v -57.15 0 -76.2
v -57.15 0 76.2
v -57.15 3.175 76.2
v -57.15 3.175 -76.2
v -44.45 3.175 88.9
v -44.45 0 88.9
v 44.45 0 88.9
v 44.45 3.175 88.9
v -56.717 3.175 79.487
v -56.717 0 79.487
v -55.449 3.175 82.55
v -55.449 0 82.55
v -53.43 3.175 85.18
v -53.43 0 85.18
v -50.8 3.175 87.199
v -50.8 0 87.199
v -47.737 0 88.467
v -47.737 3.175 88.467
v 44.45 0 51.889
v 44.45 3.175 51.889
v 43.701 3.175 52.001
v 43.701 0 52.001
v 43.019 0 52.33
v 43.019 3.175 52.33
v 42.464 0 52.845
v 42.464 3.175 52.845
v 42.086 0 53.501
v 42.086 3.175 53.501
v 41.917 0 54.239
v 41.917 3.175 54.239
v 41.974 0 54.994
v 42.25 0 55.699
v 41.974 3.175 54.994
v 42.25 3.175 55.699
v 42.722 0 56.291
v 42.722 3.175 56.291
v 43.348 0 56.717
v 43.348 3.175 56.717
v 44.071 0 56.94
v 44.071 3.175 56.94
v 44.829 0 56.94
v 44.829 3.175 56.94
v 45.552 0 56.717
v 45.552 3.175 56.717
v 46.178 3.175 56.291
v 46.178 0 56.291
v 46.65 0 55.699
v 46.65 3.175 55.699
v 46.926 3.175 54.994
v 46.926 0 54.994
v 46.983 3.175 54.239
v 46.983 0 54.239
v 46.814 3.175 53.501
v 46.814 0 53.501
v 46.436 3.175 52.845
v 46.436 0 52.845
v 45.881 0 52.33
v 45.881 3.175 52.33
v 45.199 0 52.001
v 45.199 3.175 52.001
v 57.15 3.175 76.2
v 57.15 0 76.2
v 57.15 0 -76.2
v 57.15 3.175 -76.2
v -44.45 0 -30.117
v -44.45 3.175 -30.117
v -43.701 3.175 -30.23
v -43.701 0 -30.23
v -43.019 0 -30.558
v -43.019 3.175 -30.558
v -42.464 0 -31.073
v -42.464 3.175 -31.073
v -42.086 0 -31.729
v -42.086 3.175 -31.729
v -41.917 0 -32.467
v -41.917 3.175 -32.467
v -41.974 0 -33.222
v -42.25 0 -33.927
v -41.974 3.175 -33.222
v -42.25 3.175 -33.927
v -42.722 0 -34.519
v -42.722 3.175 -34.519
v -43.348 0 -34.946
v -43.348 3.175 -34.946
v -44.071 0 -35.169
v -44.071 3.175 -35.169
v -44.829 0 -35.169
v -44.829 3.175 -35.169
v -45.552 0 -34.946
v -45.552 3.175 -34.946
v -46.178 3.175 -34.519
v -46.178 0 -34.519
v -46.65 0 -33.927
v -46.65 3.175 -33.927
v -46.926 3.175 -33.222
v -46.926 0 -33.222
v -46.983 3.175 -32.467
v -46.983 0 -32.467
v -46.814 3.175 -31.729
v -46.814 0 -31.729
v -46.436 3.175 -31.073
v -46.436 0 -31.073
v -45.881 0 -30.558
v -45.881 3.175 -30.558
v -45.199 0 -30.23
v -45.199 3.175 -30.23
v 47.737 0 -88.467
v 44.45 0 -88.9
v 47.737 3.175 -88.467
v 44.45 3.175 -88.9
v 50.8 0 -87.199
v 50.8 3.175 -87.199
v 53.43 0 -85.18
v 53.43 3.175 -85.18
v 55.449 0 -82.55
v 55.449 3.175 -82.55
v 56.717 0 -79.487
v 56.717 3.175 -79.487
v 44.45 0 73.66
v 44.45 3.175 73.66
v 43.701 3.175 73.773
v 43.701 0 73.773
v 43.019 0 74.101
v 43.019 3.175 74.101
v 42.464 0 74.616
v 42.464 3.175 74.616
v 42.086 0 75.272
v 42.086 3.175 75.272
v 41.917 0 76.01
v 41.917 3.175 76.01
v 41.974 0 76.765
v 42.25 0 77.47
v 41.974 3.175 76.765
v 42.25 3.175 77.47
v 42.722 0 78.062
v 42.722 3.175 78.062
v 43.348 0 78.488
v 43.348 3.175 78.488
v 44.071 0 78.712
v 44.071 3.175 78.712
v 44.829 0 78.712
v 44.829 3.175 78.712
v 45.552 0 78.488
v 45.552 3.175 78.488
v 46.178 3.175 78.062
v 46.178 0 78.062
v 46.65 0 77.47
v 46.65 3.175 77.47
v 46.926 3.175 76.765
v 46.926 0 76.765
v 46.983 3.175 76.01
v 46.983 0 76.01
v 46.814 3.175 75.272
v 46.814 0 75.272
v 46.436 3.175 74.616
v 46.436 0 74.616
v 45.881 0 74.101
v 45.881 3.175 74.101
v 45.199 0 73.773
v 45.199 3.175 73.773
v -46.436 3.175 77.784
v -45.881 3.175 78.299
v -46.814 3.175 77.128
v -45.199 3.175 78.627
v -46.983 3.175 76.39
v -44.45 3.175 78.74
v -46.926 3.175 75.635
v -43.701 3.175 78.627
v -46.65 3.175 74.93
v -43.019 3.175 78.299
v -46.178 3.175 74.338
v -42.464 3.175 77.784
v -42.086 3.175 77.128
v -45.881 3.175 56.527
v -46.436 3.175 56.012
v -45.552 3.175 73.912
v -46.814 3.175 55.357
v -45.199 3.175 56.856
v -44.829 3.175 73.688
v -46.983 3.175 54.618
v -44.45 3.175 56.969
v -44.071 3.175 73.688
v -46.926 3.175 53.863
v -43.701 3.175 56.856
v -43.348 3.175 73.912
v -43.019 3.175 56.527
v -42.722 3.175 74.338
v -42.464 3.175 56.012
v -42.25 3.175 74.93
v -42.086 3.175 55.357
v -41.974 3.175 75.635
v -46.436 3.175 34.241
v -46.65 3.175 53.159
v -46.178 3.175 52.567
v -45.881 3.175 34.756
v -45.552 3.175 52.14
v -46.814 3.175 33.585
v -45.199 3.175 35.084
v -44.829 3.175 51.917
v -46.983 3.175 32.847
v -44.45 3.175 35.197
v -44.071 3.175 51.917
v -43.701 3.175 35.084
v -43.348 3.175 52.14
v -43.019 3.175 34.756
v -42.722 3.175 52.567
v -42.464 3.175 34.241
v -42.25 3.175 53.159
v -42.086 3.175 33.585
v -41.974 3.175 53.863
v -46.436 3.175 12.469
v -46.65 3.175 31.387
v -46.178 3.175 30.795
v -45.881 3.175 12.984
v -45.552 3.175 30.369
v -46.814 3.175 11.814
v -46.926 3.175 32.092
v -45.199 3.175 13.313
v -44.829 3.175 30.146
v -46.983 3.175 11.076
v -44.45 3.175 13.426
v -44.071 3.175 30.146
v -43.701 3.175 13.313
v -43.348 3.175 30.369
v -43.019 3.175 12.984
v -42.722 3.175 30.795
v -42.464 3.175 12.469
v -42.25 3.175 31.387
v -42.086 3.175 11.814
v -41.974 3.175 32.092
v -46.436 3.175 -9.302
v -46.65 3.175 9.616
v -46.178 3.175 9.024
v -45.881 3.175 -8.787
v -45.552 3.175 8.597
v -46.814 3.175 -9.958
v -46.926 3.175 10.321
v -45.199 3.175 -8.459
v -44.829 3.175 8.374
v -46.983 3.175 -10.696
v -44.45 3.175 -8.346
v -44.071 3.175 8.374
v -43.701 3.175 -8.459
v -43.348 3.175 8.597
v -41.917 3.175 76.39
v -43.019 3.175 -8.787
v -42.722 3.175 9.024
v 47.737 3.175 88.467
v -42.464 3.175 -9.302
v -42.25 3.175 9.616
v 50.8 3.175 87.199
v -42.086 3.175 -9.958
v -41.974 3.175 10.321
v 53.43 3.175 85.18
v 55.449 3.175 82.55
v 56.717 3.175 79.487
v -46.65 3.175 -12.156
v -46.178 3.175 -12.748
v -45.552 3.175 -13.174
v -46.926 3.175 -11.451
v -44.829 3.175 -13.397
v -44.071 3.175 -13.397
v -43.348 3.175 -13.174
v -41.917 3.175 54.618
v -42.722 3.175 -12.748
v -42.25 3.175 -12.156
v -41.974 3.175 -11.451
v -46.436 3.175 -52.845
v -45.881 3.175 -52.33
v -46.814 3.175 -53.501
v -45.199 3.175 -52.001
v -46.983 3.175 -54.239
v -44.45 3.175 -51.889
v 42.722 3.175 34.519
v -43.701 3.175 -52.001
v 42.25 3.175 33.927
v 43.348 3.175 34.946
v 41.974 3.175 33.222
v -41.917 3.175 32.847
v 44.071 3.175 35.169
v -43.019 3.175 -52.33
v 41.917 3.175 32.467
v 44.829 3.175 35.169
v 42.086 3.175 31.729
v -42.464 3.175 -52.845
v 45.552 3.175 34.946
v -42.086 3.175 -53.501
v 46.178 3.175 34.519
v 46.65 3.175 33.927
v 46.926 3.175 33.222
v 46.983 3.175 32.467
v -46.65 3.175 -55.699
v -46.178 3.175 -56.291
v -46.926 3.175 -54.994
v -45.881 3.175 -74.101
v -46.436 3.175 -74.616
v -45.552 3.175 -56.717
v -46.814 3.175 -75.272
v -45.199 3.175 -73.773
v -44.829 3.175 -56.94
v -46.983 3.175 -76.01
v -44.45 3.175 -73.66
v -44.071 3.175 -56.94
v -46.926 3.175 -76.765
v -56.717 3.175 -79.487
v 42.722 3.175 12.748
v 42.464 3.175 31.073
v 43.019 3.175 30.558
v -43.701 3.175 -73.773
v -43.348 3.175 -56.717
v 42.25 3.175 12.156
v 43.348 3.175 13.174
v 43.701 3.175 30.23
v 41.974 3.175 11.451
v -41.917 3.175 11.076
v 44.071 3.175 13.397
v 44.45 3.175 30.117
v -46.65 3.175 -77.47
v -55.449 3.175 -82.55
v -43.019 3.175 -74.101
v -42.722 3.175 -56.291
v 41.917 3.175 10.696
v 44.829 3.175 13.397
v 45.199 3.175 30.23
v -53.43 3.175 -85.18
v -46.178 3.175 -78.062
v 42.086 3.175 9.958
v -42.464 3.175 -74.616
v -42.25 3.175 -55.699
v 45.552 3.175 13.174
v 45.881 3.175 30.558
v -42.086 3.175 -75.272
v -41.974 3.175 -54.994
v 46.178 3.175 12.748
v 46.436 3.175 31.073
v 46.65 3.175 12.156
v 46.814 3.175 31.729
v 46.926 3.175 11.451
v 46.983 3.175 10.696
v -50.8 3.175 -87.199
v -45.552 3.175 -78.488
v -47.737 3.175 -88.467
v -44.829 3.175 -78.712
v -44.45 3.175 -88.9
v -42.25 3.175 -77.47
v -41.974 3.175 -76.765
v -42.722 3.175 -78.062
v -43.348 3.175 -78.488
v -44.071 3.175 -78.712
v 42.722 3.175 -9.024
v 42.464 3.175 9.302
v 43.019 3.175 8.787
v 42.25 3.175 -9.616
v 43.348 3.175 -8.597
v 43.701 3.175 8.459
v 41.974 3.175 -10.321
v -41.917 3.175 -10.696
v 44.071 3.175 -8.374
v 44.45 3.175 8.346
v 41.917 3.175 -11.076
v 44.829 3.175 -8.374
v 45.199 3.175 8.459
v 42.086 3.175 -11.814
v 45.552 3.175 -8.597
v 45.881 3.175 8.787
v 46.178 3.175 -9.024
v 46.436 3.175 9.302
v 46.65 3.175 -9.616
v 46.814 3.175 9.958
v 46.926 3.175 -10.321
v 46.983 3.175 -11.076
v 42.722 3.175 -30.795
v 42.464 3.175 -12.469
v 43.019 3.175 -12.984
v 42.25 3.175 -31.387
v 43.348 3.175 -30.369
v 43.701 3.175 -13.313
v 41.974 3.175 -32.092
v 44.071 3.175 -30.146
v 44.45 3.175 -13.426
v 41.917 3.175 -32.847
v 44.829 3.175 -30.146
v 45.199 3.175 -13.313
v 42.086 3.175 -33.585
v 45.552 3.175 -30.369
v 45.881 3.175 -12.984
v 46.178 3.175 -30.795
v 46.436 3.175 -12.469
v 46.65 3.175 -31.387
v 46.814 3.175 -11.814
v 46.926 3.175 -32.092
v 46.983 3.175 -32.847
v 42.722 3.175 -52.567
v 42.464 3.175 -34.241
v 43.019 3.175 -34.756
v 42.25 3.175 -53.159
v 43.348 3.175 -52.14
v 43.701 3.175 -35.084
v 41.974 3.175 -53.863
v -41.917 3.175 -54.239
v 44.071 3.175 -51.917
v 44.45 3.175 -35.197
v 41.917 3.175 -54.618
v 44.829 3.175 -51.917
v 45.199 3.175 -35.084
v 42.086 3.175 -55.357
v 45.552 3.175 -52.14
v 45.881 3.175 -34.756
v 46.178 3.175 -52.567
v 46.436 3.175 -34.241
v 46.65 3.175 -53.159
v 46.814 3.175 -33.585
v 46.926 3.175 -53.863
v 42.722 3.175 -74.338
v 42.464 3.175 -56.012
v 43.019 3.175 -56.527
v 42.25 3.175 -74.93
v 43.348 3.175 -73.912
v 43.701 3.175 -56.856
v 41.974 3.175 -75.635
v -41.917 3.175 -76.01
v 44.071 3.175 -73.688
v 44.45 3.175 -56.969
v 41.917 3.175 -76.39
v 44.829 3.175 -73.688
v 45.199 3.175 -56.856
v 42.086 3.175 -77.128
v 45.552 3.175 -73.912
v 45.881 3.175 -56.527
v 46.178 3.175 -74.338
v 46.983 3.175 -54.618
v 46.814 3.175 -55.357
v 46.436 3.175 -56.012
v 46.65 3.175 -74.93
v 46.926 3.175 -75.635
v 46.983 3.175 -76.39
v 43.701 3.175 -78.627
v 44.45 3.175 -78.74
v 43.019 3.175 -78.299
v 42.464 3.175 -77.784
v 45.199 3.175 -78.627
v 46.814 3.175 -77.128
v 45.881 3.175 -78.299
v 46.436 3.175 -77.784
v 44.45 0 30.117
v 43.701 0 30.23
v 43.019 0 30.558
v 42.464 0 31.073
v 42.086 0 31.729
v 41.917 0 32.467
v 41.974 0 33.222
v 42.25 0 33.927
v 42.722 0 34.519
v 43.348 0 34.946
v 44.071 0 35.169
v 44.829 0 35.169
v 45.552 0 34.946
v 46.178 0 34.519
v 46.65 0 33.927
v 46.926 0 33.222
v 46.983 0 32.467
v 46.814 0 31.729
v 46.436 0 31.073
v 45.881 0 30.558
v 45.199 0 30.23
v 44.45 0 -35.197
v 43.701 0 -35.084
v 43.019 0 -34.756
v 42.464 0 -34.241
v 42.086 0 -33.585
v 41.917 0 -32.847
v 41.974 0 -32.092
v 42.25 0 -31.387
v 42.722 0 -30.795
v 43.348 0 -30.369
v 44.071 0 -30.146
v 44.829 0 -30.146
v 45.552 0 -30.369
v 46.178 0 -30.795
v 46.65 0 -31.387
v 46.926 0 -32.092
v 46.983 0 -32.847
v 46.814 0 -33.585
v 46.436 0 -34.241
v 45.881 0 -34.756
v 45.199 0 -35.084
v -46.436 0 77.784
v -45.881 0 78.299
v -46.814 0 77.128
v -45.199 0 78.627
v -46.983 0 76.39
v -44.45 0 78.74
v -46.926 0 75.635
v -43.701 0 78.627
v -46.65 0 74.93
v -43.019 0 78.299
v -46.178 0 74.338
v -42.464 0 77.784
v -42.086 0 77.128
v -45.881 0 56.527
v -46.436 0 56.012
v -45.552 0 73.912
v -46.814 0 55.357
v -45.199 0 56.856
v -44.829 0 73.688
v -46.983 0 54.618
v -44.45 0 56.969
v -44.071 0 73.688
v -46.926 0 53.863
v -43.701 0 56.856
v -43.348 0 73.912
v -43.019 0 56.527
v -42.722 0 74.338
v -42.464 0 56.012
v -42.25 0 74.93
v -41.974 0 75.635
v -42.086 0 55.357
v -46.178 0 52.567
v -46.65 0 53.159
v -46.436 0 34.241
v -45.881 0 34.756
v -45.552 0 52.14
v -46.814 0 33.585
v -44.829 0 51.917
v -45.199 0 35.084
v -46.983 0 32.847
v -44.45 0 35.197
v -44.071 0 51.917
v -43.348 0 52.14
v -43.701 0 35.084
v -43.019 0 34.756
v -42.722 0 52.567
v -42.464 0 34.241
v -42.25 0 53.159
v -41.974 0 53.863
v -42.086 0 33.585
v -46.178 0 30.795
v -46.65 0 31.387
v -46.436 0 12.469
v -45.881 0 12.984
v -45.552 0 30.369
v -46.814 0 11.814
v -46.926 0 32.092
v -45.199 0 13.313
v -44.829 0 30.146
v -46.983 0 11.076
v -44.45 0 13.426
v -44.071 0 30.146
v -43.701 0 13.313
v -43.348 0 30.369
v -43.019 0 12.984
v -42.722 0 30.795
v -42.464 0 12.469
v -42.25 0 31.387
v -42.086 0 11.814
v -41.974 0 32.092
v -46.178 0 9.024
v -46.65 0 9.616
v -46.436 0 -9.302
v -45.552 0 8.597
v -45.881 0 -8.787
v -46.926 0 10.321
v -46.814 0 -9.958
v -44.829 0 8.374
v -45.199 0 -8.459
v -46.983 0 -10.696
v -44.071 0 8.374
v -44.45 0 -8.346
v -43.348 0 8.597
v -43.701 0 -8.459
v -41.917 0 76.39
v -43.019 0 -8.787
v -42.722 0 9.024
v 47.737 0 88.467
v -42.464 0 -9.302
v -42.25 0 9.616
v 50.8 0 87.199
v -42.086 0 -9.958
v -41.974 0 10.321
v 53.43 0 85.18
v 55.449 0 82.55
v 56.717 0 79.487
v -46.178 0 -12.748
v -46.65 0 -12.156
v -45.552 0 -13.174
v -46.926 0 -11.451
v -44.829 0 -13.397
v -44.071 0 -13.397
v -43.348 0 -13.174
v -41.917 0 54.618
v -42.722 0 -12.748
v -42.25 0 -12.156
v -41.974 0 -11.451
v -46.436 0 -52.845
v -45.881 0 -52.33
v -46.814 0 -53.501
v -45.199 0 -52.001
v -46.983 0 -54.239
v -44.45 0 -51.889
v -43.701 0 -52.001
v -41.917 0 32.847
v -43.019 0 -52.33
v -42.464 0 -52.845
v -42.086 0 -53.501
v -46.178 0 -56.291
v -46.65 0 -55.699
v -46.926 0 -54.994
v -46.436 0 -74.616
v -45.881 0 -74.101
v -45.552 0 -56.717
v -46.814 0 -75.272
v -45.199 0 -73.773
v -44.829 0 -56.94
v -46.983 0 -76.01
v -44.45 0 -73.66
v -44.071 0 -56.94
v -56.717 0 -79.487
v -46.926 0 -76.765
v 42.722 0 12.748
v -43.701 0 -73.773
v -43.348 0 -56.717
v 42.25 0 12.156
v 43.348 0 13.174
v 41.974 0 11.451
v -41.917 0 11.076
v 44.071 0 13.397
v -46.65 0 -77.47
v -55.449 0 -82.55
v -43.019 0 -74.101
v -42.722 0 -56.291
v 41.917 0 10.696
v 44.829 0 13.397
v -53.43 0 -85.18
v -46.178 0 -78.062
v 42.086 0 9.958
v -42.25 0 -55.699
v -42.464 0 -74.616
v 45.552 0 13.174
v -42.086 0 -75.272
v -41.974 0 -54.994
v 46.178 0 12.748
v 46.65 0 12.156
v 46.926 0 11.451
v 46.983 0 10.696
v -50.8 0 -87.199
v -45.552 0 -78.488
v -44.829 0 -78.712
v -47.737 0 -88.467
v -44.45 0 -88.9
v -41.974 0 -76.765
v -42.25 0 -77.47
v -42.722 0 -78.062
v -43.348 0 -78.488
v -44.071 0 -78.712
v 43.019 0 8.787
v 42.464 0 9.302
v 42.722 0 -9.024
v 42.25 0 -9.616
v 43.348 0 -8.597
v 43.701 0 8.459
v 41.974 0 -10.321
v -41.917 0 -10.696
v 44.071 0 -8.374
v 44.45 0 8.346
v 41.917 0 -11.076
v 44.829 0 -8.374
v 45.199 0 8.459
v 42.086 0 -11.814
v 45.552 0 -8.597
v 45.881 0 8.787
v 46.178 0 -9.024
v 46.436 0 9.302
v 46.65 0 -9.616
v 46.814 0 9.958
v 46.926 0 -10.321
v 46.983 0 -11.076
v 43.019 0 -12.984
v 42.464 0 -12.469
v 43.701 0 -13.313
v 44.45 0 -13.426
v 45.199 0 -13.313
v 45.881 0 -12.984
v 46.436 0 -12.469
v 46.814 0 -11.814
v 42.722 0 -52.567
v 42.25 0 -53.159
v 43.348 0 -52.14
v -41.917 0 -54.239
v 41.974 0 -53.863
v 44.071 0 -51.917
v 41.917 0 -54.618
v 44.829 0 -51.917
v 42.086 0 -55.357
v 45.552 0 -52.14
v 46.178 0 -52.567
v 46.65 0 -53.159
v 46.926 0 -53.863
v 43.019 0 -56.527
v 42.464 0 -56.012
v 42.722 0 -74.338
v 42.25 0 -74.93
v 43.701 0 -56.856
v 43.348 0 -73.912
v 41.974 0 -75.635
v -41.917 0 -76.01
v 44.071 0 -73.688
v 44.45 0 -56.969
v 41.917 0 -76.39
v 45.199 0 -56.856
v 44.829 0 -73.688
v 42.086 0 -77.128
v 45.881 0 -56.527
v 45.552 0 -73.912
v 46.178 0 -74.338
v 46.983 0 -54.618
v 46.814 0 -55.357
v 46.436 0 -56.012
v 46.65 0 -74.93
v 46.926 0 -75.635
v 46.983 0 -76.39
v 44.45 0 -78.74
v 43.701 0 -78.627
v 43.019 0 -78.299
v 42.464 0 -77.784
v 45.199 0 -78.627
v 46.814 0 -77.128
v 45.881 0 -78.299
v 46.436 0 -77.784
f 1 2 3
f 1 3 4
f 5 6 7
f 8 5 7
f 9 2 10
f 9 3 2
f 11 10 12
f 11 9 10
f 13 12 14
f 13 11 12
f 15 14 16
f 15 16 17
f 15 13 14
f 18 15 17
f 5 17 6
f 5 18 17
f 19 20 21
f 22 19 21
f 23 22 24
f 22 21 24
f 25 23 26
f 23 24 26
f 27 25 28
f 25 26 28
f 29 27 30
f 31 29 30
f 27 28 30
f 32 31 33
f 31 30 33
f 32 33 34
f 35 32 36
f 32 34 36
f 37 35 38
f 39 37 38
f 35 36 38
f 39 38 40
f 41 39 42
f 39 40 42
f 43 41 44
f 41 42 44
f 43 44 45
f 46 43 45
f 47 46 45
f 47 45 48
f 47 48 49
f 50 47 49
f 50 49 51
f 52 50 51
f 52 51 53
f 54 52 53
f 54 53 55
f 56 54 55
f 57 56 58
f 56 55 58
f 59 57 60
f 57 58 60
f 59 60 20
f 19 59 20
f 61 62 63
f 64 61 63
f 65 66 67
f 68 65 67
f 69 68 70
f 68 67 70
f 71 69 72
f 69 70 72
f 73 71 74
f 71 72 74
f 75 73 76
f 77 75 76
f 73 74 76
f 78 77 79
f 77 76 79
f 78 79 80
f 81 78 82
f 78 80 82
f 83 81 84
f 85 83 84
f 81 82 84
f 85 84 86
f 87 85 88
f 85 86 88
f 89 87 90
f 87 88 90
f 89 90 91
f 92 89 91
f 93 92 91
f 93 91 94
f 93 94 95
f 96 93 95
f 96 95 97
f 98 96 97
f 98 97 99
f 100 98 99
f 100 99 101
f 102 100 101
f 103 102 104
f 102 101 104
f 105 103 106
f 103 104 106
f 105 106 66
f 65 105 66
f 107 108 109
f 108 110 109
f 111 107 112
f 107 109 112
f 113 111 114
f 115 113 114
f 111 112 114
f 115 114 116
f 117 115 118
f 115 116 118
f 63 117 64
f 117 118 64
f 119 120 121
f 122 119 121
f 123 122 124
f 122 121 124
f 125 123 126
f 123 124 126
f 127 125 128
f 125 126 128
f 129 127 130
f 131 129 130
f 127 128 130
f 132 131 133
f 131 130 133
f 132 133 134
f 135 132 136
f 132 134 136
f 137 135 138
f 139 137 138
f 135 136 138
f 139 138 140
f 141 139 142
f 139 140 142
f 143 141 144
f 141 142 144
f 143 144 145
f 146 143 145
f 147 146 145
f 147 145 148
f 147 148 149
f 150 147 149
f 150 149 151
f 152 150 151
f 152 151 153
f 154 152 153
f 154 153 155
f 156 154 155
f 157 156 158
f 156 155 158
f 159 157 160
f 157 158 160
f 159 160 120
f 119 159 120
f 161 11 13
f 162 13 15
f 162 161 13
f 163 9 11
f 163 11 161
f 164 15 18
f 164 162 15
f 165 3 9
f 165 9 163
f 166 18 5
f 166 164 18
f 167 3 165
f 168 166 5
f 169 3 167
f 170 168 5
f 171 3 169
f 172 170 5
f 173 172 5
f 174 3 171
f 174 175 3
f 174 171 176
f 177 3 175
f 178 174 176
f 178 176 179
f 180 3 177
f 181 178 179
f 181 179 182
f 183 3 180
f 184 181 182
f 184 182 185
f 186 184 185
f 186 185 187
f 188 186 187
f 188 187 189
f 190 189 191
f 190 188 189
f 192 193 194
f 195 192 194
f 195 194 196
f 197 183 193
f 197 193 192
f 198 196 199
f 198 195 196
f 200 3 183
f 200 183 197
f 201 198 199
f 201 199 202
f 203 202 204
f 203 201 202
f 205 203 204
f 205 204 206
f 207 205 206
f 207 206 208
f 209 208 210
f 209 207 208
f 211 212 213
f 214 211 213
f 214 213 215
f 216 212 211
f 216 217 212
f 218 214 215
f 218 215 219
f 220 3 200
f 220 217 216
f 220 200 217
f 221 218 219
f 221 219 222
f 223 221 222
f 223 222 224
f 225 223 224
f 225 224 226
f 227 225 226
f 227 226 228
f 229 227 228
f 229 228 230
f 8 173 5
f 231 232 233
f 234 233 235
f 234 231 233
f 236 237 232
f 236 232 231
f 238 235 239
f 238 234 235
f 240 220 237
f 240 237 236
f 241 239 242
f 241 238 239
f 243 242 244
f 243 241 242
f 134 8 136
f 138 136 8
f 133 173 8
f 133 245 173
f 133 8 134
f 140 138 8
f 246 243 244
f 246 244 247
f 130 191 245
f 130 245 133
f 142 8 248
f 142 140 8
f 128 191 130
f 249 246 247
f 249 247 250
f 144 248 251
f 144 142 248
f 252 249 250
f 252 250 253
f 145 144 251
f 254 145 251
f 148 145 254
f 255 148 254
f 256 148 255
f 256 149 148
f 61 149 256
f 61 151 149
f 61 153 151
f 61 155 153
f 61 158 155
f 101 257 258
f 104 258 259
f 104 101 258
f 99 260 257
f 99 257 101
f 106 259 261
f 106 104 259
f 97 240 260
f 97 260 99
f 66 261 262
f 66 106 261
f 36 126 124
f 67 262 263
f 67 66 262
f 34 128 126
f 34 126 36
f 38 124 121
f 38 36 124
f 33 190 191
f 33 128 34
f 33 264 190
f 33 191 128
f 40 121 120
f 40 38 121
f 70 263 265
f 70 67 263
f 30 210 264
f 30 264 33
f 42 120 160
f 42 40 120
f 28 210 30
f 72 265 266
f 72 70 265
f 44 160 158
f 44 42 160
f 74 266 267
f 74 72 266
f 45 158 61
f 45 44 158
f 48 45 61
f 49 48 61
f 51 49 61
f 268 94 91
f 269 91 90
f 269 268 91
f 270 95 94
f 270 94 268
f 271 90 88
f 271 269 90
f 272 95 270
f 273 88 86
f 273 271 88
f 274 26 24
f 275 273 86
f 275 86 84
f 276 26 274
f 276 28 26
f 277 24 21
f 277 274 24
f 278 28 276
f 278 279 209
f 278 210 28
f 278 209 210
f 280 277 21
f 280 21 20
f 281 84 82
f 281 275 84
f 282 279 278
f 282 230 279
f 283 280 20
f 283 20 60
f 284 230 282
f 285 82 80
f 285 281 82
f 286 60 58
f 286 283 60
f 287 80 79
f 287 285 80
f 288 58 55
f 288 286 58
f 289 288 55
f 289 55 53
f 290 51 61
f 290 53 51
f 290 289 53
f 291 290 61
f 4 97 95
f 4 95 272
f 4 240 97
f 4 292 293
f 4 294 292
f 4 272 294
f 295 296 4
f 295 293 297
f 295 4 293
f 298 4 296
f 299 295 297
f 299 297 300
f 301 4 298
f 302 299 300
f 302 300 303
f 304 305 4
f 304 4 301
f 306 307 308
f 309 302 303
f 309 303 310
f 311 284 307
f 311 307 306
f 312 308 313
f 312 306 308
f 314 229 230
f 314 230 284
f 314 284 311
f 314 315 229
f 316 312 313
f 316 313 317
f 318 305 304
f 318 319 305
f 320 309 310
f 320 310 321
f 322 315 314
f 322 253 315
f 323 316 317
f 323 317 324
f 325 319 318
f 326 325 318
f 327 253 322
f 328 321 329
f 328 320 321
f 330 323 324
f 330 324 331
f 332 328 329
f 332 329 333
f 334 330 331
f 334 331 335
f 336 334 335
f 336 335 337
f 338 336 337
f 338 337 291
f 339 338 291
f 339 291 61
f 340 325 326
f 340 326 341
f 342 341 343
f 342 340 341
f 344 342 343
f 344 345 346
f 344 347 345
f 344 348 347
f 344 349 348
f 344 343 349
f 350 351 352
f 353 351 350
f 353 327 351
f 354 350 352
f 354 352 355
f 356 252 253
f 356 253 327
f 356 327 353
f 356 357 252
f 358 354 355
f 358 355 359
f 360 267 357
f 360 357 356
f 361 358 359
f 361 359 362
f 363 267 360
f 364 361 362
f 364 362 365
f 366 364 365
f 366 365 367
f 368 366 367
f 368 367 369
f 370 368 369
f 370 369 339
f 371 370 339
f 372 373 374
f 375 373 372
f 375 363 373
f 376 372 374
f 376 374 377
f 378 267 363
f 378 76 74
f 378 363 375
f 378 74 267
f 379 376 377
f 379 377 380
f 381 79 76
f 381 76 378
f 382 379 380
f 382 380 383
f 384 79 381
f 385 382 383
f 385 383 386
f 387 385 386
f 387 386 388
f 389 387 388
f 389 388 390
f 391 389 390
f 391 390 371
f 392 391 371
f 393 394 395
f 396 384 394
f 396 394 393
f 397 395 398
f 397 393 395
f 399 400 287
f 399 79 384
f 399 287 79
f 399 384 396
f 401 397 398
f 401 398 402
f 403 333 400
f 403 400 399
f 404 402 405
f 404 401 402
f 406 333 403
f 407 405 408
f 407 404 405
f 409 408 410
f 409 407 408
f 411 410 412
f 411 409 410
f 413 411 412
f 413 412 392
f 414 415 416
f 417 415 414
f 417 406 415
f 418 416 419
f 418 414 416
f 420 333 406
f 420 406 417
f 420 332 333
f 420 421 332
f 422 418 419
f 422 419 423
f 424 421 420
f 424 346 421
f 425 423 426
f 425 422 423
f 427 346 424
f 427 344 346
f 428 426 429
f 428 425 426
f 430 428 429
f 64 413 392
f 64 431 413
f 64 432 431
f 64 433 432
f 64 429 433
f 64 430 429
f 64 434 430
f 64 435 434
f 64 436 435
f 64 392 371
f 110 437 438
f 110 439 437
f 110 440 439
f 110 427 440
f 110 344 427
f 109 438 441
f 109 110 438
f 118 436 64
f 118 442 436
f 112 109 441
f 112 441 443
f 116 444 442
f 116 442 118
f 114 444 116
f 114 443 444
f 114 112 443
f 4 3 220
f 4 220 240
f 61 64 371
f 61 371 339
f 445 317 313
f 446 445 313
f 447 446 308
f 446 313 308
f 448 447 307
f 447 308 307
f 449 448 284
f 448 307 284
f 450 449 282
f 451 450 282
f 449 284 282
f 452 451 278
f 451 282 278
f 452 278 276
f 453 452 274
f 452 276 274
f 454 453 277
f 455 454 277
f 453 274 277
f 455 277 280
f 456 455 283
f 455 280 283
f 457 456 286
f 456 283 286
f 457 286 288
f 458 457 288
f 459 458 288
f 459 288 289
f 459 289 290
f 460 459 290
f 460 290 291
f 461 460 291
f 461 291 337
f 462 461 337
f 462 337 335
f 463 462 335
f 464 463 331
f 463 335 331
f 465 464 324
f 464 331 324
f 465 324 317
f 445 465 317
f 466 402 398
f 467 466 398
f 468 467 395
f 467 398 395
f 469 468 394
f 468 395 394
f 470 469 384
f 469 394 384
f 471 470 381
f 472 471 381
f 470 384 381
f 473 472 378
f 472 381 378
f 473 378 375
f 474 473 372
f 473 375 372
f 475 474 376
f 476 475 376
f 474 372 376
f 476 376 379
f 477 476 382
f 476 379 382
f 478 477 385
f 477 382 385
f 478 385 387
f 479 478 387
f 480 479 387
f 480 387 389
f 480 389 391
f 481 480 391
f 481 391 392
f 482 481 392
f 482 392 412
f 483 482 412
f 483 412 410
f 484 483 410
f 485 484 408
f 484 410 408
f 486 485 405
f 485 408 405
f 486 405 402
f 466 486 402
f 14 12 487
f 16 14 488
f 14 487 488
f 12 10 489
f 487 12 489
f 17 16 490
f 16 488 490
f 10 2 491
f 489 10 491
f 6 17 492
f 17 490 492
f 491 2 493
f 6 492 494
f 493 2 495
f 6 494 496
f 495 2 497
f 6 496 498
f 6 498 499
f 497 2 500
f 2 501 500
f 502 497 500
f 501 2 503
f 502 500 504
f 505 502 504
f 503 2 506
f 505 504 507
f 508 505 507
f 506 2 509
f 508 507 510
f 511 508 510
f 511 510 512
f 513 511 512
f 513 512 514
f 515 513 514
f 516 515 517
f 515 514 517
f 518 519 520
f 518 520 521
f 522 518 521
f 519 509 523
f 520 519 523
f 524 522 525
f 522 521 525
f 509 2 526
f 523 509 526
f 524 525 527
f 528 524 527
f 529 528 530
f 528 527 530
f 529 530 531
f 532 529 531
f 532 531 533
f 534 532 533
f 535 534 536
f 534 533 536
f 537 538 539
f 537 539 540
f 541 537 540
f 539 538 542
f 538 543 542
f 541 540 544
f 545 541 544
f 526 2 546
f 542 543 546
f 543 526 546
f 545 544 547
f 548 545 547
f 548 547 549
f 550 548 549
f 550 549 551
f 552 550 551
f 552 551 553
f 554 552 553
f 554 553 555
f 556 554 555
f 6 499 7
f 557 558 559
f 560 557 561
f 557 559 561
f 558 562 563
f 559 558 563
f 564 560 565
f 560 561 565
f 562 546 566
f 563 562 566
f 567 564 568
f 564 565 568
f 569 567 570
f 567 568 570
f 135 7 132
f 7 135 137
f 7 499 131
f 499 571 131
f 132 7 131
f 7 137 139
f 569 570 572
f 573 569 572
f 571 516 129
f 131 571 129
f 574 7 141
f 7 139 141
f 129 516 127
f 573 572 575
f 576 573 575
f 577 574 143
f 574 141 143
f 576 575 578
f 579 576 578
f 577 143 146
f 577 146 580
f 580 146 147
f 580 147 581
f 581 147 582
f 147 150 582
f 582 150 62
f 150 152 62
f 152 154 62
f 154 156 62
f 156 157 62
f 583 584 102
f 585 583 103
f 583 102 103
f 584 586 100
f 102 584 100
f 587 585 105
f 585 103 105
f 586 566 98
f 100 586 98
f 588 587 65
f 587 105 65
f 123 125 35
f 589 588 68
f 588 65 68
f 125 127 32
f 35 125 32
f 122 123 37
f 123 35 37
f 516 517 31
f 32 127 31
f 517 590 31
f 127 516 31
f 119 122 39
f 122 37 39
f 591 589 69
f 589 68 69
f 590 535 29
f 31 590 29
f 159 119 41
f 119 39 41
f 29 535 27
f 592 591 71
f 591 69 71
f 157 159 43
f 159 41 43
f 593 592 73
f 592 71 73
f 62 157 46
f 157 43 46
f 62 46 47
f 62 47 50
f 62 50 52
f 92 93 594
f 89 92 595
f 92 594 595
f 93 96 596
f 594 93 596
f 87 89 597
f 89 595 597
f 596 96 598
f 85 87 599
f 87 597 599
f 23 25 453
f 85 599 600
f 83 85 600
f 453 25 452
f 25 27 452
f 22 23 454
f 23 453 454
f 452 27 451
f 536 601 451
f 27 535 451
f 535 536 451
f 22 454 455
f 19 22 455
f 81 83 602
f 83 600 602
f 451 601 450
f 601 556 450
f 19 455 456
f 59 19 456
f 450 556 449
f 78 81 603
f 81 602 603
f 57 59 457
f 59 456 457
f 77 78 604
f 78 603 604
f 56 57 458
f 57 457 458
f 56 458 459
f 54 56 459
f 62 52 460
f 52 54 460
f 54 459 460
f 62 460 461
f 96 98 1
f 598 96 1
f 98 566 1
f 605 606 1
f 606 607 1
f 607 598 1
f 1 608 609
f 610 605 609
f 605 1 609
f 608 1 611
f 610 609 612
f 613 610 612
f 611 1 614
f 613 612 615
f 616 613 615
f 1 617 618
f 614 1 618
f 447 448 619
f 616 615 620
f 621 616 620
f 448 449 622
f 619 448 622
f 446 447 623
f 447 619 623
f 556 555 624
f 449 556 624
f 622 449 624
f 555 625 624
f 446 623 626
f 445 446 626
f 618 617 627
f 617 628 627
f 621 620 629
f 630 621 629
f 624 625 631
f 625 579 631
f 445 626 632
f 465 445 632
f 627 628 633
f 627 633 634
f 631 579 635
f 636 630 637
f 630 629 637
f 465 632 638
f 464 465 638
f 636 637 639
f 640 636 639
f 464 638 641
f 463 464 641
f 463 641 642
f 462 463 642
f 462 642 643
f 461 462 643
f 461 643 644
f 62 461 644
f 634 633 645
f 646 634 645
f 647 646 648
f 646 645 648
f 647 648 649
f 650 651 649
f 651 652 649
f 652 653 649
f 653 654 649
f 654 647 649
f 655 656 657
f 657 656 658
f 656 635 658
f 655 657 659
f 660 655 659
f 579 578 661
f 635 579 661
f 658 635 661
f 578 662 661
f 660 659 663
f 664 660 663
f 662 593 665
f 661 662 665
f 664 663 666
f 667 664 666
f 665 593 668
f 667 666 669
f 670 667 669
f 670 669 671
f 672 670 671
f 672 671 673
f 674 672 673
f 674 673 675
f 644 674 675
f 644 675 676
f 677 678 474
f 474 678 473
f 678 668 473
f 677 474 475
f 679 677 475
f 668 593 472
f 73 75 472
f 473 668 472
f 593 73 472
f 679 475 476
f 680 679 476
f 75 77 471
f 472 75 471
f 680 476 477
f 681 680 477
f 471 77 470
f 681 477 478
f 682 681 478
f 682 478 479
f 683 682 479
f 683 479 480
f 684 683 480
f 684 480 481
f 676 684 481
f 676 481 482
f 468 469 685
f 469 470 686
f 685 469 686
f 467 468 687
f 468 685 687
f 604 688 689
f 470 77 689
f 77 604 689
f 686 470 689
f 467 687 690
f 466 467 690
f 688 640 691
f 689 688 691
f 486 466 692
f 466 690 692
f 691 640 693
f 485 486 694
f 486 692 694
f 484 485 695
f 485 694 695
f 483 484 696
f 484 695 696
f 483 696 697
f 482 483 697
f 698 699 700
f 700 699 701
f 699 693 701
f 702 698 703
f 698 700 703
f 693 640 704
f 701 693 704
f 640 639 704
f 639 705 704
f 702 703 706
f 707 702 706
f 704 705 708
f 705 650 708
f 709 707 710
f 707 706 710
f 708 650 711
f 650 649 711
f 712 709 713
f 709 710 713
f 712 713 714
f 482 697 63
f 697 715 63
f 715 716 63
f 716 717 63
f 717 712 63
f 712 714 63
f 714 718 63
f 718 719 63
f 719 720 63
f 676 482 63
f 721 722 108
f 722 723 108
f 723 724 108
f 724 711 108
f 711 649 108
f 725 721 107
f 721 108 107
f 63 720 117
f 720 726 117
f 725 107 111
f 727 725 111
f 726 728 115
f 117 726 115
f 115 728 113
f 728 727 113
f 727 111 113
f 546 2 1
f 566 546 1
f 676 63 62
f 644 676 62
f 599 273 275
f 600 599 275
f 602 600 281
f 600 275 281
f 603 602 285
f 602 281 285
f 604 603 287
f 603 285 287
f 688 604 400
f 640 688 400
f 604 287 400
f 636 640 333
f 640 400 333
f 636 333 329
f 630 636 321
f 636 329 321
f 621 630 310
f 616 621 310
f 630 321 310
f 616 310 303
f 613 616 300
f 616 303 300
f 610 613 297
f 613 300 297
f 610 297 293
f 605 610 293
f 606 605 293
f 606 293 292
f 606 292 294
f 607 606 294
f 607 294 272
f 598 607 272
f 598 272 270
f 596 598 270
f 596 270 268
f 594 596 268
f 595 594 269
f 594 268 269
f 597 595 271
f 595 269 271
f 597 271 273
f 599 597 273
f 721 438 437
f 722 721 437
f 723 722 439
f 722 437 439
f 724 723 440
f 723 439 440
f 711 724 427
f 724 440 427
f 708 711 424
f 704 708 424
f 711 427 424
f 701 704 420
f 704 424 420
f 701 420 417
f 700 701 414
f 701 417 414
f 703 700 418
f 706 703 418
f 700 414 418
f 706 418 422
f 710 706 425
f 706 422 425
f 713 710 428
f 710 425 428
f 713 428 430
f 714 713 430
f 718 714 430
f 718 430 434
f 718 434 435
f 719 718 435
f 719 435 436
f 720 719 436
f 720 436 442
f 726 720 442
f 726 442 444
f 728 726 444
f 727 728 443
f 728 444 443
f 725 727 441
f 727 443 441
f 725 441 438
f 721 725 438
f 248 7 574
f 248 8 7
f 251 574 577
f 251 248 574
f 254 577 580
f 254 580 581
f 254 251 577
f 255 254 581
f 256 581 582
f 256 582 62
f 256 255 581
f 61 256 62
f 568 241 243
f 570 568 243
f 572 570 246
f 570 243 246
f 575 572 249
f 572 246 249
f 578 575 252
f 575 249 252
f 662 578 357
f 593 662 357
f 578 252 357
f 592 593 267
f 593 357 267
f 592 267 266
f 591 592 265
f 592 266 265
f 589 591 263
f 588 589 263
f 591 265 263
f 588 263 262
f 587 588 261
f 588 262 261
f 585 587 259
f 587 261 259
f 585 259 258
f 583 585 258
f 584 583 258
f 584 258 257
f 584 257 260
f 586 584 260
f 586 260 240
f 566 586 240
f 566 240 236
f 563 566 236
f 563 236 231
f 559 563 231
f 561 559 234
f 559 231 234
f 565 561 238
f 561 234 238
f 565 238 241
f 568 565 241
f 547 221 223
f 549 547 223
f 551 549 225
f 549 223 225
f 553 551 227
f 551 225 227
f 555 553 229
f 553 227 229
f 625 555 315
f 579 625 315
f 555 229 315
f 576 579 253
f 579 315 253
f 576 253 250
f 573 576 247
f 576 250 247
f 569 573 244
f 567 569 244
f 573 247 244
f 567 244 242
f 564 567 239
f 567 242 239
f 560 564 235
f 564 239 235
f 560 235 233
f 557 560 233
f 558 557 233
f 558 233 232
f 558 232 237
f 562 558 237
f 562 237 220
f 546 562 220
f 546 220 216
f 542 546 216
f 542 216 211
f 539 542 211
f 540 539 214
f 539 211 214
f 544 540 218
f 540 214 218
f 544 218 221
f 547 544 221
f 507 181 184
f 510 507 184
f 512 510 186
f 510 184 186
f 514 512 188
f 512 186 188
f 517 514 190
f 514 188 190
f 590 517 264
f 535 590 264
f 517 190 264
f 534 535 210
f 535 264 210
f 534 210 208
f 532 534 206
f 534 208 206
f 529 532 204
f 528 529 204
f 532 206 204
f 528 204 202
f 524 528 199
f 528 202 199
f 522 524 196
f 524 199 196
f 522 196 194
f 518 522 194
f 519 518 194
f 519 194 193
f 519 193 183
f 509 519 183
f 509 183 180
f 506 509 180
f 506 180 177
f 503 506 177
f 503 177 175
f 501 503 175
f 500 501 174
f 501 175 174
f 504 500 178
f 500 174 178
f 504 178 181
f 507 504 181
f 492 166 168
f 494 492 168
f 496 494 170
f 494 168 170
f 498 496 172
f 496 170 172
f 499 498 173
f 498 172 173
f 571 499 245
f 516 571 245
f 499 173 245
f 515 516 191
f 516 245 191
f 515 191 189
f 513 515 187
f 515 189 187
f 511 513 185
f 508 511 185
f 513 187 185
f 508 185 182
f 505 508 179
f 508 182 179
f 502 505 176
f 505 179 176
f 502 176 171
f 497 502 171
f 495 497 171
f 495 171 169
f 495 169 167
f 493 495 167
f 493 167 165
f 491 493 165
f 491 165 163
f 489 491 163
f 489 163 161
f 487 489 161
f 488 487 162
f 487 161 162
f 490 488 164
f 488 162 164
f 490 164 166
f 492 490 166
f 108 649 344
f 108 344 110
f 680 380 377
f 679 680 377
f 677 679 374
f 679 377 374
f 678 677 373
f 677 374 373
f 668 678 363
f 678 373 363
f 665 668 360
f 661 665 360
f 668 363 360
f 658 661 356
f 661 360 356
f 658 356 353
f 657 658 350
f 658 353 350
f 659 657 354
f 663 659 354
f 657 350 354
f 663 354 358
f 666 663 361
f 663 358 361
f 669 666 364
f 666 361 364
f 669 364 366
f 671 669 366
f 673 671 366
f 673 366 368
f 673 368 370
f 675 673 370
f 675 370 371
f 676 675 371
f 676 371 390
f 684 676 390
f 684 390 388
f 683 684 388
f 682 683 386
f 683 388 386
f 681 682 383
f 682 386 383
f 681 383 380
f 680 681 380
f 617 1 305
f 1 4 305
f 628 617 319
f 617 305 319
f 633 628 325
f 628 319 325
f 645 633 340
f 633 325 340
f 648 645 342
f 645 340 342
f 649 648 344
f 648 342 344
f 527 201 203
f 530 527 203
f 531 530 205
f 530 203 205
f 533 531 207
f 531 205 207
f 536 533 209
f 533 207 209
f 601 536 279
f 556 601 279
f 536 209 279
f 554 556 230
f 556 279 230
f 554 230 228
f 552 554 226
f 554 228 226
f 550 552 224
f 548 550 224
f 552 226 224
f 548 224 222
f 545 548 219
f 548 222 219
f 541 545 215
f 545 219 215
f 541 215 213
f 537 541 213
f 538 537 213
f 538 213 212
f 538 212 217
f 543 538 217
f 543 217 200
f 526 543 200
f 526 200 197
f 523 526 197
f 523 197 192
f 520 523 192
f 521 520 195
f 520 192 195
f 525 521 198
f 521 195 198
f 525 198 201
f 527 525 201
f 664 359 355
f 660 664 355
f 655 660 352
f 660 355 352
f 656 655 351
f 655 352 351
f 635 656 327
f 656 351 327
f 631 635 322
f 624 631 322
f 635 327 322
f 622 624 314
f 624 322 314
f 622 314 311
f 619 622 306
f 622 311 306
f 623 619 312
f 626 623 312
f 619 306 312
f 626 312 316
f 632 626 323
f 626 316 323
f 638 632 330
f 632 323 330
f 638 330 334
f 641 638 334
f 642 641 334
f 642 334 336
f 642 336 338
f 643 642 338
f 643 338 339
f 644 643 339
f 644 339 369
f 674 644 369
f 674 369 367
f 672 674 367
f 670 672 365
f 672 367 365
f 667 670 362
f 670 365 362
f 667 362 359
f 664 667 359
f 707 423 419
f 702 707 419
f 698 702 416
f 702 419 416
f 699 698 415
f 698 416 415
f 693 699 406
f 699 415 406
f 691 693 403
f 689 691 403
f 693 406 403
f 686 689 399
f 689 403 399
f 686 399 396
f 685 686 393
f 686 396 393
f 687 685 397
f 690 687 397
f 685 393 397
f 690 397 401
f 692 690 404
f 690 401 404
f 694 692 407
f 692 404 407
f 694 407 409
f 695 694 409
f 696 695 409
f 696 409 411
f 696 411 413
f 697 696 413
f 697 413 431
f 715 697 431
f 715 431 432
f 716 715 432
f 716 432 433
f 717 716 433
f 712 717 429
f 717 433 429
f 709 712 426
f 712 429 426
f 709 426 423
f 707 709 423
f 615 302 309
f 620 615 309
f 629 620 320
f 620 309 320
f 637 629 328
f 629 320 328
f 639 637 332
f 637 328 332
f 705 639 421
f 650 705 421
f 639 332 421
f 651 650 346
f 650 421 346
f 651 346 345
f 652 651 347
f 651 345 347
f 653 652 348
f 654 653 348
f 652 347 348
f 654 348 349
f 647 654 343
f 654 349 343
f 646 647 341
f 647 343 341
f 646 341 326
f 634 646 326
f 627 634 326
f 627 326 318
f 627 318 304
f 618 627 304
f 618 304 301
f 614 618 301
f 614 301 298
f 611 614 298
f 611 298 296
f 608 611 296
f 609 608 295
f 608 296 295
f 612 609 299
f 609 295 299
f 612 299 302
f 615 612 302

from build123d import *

# Parameters (mm, degrees)
SKETCH1_W           = 114.3
SKETCH1_H           = 177.8
BOSS_EXTRUDE1_DEPTH = 3.175
SKETCH2_R           = 2.54
CUT_EXTRUDE1_DEPTH  = 3.175
FILLET1_R           = 12.7


with BuildPart() as part:
    # Sketch1 → Boss-Extrude1 (new body)
    with BuildSketch(Plane(origin=(0, 0, 0), x_dir=(1, 0, 0), z_dir=(0, 1, 0))):
        Rectangle(SKETCH1_W, SKETCH1_H)
    extrude(amount=BOSS_EXTRUDE1_DEPTH)

    # Sketch2 → Cut-Extrude1 (cut)
    with BuildSketch(Plane(origin=(0, 3.175, 0), x_dir=(1, 0, 0), z_dir=(0, 1, 0))):
        with Locations(Location((-44.45, 76.2, 0), (0, 0, 270))):
            Circle(SKETCH2_R)
        with Locations(Location((-44.45, 54.428571429, 0), (0, 0, 270))):
            Circle(SKETCH2_R)
        with Locations(Location((-44.45, 32.657142857, 0), (0, 0, 270))):
            Circle(SKETCH2_R)
        with Locations(Location((-44.45, 10.885714286, 0), (0, 0, 270))):
            Circle(SKETCH2_R)
        with Locations(Location((-44.45, -10.885714286, 0), (0, 0, 270))):
            Circle(SKETCH2_R)
        with Locations(Location((-44.45, -32.657142857, 0), (0, 0, 270))):
            Circle(SKETCH2_R)
        with Locations(Location((-44.45, -54.428571429, 0), (0, 0, 270))):
            Circle(SKETCH2_R)
        with Locations(Location((-44.45, -76.2, 0), (0, 0, 270))):
            Circle(SKETCH2_R)
        with Locations(Location((44.45, -76.2, 0), (0, 0, 90))):
            Circle(SKETCH2_R)
        with Locations(Location((44.45, -54.428571429, 0), (0, 0, 90))):
            Circle(SKETCH2_R)
        with Locations(Location((44.45, -32.657142857, 0), (0, 0, 90))):
            Circle(SKETCH2_R)
        with Locations(Location((44.45, -10.885714286, 0), (0, 0, 90))):
            Circle(SKETCH2_R)
        with Locations(Location((44.45, 10.885714286, 0), (0, 0, 90))):
            Circle(SKETCH2_R)
        with Locations(Location((44.45, 32.657142857, 0), (0, 0, 90))):
            Circle(SKETCH2_R)
        with Locations(Location((44.45, 54.428571429, 0), (0, 0, 90))):
            Circle(SKETCH2_R)
        with Locations(Location((44.45, 76.2, 0), (0, 0, 90))):
            Circle(SKETCH2_R)
    extrude(amount=-CUT_EXTRUDE1_DEPTH, mode=Mode.SUBTRACT)

    # Fillet1
    fillet1_edges = [part.edges().sort_by_distance(p)[0] for p in [
        (57.15, 1.5875, 88.9),
        (-57.15, 1.5875, 88.9),
        (-57.15, 1.5875, -88.9),
        (57.15, 1.5875, -88.9),
    ]]
    fillet(fillet1_edges, radius=FILLET1_R)


solid = part.part
